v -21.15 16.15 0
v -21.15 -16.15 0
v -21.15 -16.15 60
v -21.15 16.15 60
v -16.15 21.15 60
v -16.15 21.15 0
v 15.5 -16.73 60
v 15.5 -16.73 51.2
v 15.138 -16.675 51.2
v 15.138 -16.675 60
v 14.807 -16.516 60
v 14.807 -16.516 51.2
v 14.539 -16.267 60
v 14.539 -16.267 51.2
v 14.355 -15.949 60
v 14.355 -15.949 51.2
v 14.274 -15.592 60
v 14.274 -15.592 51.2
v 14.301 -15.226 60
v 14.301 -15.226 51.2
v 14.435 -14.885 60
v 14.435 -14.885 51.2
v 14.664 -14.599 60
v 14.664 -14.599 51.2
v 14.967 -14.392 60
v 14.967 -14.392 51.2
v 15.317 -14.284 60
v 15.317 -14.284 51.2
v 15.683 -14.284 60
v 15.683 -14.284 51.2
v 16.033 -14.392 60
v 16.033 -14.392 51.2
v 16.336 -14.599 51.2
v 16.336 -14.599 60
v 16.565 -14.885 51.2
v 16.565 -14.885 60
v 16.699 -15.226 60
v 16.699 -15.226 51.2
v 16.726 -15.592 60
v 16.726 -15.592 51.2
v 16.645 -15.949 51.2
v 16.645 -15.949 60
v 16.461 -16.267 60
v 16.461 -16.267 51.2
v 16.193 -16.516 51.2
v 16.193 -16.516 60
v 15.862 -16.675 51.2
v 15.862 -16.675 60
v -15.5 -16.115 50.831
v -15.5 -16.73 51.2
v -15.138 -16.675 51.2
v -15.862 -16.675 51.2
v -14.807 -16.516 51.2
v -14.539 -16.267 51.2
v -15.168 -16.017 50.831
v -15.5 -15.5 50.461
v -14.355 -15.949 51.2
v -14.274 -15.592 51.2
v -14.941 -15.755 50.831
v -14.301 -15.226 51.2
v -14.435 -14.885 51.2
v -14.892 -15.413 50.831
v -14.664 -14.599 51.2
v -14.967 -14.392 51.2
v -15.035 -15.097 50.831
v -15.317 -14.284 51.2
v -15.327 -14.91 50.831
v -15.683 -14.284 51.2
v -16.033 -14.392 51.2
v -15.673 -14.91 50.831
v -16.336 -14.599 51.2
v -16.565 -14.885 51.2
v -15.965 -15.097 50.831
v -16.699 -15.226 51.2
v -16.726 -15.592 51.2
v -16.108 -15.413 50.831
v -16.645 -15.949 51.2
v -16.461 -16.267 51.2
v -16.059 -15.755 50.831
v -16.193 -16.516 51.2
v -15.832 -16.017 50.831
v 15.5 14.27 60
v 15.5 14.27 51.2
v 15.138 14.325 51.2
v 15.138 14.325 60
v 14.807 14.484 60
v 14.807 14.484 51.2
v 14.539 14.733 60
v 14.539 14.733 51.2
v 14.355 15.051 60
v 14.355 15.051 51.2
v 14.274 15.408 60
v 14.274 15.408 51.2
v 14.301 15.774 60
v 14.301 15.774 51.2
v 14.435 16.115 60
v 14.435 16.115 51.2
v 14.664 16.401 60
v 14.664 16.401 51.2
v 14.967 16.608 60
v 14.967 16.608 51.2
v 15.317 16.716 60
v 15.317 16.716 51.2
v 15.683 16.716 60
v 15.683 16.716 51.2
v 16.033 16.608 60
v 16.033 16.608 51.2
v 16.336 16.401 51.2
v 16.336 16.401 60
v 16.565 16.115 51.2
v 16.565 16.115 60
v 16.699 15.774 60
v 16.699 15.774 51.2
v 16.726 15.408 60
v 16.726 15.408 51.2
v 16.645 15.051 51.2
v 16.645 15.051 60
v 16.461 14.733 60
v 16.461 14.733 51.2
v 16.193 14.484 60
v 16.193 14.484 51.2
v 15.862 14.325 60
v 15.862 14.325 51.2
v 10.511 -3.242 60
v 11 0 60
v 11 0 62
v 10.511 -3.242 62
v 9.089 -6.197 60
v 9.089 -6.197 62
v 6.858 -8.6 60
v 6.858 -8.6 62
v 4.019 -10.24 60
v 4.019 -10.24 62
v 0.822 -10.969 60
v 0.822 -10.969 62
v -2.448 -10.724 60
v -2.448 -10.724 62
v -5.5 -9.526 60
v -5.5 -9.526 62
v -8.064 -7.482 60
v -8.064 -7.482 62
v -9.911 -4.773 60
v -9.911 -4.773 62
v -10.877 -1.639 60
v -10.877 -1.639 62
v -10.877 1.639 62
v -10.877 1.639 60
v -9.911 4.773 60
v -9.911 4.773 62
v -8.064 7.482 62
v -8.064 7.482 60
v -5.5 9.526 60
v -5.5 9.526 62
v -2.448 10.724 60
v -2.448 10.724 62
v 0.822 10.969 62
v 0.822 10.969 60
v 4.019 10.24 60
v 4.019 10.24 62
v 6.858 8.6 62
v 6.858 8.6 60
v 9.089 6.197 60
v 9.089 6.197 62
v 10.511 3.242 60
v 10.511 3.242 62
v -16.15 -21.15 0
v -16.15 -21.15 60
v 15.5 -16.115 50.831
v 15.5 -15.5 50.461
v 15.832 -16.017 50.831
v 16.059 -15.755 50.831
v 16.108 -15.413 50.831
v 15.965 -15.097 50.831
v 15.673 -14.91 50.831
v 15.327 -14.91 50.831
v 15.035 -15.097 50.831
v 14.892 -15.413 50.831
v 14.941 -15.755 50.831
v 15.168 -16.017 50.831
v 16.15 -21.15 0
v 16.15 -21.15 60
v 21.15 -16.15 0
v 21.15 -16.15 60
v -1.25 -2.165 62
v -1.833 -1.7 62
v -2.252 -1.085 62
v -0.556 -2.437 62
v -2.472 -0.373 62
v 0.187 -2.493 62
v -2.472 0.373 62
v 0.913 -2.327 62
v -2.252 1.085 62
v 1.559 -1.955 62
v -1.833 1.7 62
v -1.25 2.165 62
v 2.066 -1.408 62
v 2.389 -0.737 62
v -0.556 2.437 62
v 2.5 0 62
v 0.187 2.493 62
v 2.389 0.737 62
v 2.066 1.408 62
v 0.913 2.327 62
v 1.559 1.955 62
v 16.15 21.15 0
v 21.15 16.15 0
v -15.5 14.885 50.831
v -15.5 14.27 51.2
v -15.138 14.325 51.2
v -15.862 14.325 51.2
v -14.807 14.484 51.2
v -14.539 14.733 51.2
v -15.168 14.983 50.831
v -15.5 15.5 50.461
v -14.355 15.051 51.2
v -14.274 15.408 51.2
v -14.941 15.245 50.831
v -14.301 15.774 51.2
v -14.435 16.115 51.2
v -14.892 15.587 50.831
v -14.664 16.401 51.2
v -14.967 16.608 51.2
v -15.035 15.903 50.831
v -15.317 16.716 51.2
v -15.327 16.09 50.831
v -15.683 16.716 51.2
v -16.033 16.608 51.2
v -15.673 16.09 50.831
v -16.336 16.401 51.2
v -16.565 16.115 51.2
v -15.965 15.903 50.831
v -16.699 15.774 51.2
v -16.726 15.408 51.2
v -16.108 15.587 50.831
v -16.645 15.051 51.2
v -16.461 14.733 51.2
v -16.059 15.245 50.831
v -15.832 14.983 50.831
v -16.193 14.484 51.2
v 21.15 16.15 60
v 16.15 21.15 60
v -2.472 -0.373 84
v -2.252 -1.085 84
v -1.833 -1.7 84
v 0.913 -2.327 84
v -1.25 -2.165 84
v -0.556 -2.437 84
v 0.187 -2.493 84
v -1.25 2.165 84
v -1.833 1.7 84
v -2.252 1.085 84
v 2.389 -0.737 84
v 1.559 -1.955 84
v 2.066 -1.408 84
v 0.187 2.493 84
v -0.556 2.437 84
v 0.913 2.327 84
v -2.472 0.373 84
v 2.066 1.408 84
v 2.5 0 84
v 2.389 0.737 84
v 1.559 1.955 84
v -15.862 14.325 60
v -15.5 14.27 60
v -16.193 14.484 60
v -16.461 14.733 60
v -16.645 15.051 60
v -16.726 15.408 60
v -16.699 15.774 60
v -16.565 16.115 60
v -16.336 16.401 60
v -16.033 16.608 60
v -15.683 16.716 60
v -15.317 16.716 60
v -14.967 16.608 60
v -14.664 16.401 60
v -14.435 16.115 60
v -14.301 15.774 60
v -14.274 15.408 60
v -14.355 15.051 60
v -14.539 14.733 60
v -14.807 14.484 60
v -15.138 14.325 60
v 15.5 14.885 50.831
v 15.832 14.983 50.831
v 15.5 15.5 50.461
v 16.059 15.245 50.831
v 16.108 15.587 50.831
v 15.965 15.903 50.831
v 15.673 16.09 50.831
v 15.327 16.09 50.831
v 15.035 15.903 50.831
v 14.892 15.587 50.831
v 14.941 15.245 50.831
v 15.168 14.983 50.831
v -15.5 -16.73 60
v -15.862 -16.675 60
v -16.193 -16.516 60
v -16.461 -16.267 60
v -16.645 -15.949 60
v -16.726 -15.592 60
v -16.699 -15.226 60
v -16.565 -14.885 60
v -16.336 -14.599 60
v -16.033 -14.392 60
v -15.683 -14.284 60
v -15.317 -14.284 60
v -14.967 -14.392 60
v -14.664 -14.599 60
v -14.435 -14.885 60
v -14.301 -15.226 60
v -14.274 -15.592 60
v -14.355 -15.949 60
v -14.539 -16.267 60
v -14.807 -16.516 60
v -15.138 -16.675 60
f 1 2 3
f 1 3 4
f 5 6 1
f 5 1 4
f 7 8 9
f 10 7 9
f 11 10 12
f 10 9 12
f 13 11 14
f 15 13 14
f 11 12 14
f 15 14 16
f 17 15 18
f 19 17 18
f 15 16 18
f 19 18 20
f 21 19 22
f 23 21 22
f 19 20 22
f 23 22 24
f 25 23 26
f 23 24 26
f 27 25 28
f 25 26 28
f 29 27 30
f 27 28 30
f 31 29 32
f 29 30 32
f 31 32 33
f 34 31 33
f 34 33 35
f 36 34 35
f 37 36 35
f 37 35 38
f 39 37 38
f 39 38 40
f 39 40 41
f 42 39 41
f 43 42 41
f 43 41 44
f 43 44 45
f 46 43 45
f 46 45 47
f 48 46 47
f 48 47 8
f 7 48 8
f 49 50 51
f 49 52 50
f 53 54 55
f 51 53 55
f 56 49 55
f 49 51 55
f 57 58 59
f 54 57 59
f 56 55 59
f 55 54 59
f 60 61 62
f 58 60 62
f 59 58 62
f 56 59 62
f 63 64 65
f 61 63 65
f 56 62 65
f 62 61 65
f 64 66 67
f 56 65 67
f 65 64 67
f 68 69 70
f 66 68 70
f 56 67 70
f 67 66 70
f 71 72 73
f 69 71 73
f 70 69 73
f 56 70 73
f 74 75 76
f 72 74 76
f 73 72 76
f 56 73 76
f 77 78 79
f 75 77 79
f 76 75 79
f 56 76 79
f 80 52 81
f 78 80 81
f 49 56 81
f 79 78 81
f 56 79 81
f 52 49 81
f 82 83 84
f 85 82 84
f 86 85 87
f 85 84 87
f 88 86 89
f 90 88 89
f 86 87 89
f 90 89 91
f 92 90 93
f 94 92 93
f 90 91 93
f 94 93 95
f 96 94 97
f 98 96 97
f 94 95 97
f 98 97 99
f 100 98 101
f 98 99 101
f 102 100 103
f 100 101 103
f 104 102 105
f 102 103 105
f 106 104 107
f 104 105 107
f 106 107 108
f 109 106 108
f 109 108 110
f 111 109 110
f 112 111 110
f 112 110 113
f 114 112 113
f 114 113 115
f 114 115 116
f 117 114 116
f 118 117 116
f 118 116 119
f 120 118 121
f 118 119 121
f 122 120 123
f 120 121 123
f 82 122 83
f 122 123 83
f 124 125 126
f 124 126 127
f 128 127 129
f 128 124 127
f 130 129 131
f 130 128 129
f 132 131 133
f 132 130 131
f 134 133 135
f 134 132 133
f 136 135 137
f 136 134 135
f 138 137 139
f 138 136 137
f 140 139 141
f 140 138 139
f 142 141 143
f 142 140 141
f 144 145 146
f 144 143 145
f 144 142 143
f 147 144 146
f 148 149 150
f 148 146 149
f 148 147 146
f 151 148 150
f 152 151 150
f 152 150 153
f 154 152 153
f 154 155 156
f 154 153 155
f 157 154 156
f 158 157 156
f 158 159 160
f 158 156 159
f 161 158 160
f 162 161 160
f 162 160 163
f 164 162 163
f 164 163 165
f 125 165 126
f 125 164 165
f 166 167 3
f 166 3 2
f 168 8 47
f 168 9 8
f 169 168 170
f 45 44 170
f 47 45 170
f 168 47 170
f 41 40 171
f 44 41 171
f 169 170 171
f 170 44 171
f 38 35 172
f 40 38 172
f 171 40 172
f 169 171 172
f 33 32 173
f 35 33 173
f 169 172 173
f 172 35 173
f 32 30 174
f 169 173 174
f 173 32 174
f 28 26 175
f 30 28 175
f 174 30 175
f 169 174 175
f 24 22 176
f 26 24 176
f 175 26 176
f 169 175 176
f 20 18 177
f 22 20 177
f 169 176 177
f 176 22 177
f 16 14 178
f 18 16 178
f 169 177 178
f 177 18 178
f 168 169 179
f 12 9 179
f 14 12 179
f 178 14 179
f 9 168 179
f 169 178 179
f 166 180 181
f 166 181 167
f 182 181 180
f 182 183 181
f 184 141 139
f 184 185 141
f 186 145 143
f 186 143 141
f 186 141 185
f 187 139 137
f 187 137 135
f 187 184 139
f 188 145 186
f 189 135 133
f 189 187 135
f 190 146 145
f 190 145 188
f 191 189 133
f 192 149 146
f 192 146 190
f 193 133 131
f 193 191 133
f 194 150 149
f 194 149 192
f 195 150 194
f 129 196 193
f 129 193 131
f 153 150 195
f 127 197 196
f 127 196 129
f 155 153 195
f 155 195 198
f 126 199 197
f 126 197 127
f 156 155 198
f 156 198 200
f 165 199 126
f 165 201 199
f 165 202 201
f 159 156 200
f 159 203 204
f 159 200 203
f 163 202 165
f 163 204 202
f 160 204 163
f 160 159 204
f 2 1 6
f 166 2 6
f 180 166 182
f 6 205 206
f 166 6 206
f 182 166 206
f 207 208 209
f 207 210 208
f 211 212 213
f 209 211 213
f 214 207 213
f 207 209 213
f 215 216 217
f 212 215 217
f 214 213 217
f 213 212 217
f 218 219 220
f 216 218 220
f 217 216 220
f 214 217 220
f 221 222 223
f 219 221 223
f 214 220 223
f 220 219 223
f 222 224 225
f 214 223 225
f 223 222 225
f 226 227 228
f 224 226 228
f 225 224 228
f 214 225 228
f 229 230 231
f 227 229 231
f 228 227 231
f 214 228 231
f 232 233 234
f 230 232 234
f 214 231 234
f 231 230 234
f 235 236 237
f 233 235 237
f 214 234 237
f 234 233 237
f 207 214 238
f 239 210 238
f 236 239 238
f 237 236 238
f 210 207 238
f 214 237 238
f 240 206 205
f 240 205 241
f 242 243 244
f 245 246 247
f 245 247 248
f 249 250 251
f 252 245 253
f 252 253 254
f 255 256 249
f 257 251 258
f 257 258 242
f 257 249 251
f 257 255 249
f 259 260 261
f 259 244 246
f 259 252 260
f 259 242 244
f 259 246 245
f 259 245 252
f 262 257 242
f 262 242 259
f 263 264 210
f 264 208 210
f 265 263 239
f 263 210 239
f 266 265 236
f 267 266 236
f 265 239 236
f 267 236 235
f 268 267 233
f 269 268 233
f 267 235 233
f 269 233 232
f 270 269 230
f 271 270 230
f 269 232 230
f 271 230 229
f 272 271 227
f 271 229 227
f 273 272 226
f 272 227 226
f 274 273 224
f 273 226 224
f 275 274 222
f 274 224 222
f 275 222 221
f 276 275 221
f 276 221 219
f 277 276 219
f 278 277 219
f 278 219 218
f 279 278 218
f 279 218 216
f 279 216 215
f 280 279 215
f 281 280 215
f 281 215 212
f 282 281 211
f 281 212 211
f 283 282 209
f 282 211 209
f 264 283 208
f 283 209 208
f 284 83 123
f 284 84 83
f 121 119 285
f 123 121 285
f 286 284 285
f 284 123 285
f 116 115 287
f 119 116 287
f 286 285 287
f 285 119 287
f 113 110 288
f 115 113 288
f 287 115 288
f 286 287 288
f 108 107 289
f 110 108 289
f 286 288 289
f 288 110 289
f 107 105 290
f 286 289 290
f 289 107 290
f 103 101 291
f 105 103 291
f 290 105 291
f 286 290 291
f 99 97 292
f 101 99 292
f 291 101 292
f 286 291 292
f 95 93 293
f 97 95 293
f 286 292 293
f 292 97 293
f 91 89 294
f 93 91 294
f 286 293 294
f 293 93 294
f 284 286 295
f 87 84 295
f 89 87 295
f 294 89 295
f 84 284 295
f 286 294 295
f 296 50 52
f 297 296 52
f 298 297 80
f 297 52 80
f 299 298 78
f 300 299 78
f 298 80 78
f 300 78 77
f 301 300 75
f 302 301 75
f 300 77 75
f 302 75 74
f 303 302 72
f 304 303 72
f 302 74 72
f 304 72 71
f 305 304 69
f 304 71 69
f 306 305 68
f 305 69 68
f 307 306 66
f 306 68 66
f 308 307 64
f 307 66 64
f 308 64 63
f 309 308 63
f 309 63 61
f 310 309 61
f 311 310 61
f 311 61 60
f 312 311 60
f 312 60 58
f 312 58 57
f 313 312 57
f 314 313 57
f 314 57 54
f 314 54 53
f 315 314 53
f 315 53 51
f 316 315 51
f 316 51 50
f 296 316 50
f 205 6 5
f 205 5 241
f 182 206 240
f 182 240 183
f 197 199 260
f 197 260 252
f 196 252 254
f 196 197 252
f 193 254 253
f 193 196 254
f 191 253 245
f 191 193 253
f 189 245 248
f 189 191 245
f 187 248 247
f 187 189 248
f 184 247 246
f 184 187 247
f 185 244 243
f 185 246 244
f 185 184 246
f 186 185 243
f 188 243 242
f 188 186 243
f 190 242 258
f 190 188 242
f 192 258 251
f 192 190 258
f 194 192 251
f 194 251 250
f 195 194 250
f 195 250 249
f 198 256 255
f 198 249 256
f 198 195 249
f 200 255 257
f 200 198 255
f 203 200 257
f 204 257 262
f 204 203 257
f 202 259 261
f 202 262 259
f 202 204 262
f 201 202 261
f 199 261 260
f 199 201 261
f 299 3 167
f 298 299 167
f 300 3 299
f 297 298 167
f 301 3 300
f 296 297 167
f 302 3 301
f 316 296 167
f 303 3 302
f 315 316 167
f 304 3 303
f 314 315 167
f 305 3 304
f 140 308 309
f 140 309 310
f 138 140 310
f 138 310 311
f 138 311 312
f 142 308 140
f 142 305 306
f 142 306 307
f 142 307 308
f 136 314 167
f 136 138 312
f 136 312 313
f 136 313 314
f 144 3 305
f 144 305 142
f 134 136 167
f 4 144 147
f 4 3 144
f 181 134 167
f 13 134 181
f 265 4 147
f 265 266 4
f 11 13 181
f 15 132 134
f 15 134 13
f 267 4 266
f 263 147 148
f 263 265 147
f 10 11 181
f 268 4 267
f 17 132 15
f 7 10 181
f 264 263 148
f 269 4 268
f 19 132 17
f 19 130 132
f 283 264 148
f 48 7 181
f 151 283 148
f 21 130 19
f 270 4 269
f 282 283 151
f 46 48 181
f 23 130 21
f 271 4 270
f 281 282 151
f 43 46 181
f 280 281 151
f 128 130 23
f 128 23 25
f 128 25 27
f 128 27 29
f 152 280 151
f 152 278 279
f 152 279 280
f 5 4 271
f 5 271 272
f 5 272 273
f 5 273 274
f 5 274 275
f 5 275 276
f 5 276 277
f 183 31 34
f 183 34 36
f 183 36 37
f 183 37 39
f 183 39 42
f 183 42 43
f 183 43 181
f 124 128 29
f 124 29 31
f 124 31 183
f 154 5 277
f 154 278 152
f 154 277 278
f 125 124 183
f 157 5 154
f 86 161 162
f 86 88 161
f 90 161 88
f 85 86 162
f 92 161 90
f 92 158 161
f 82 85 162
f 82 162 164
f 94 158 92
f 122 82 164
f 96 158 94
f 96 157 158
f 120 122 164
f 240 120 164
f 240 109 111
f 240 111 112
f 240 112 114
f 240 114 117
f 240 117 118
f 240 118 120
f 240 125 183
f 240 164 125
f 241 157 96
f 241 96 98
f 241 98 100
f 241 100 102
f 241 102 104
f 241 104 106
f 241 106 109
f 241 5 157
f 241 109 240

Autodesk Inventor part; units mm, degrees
ref_plane "YZ Plane" through (0, 0, 0) normal (1, 0, 0) x (0, 1, 0)
ref_plane "XZ Plane" through (0, 0, 0) normal (0, 1, 0) x (-1, 0, 0)
ref_plane "XY Plane" through (0, 0, 0) normal (0, 0, 1) x (1, 0, 0)
sketch "Skizze1" plane through (0, 0, 0) normal (0, 0, 1) x (1, 0, 0)
  line L0 (-29.61, 0) -> (29.61, 0) projected
  line L1 (0, -29.61) -> (0, 29.61) projected
  line L2 (21.15, -21.15) -> (-21.15, -21.15)
  line L3 (-21.15, -21.15) -> (-21.15, 21.15)
  line L4 (-21.15, 21.15) -> (21.15, 21.15)
  line L5 (21.15, 21.15) -> (21.15, -21.15)
  line L6 (21.15, -21.15) -> (-21.15, 21.15) construction
  line L7 (-21.15, -21.15) -> (21.15, 21.15) construction
  point P0 (0, 0)
  dimension "d0" = 42.3
  dimension "d1" = 42.3
extrude "Extrusion1" add sketch "Skizze1" along normal blind 60
sketch "Skizze2" plane through (0, 0, 60) normal (0, 0, 1) x (1, 0, 0)
  circle A0 centre (0, 0) radius 11
  dimension "d4" = 22
extrude "Extrusion2" add sketch "Skizze2" along normal blind 2
sketch "Skizze3" plane through (0, 0, 62) normal (0, 0, 1) x (1, 0, 0)
  circle A0 centre (0, 0) radius 2.5
  dimension "d7" = 5
extrude "Extrusion3" add sketch "Skizze3" along normal blind 22
sketch "Skizze4" plane through (0, 0, 60) normal (0, 0, 1) x (1, 0, 0)
  circle A0 centre (0, 0) radius 11 projected
  line L0 (21.15, 21.15) -> (-21.15, 21.15) projected
  line L1 (-21.15, 21.15) -> (-21.15, -21.15) projected
  line L2 (-21.15, -21.15) -> (21.15, -21.15) projected
  line L3 (21.15, -21.15) -> (21.15, 21.15) projected
  line L4 (15.5, -15.5) -> (-15.5, -15.5)
  line L5 (-15.5, -15.5) -> (-15.5, 15.5)
  line L6 (-15.5, 15.5) -> (15.5, 15.5)
  line L7 (15.5, 15.5) -> (15.5, -15.5)
  line L8 (15.5, -15.5) -> (-15.5, 15.5) construction
  line L9 (-15.5, -15.5) -> (15.5, 15.5) construction
  dimension "d10" = 31
  dimension "d11" = 31
hole "Bohrung1" at (-15.5, 15.5, 60) at (15.5, 15.5, 60) at (15.5, -15.5, 60) at (-15.5, -15.5, 60) direction (0, 0, -1) diameter 2.459 depth 8.8 tip angle 118 thread size "M3x0.5" class "6H" standard "ISO Metric profile"
chamfer "Fasen1" distance 5 angle 45 4 edges at (21.15, -21.15, 30) (21.15, 21.15, 30) (-21.15, 21.15, 30) (-21.15, -21.15, 30)
equation "\"d1\" = d0"
equation "\"d11\" = d10"
properties part number "Motor ST4118D1804-A"
